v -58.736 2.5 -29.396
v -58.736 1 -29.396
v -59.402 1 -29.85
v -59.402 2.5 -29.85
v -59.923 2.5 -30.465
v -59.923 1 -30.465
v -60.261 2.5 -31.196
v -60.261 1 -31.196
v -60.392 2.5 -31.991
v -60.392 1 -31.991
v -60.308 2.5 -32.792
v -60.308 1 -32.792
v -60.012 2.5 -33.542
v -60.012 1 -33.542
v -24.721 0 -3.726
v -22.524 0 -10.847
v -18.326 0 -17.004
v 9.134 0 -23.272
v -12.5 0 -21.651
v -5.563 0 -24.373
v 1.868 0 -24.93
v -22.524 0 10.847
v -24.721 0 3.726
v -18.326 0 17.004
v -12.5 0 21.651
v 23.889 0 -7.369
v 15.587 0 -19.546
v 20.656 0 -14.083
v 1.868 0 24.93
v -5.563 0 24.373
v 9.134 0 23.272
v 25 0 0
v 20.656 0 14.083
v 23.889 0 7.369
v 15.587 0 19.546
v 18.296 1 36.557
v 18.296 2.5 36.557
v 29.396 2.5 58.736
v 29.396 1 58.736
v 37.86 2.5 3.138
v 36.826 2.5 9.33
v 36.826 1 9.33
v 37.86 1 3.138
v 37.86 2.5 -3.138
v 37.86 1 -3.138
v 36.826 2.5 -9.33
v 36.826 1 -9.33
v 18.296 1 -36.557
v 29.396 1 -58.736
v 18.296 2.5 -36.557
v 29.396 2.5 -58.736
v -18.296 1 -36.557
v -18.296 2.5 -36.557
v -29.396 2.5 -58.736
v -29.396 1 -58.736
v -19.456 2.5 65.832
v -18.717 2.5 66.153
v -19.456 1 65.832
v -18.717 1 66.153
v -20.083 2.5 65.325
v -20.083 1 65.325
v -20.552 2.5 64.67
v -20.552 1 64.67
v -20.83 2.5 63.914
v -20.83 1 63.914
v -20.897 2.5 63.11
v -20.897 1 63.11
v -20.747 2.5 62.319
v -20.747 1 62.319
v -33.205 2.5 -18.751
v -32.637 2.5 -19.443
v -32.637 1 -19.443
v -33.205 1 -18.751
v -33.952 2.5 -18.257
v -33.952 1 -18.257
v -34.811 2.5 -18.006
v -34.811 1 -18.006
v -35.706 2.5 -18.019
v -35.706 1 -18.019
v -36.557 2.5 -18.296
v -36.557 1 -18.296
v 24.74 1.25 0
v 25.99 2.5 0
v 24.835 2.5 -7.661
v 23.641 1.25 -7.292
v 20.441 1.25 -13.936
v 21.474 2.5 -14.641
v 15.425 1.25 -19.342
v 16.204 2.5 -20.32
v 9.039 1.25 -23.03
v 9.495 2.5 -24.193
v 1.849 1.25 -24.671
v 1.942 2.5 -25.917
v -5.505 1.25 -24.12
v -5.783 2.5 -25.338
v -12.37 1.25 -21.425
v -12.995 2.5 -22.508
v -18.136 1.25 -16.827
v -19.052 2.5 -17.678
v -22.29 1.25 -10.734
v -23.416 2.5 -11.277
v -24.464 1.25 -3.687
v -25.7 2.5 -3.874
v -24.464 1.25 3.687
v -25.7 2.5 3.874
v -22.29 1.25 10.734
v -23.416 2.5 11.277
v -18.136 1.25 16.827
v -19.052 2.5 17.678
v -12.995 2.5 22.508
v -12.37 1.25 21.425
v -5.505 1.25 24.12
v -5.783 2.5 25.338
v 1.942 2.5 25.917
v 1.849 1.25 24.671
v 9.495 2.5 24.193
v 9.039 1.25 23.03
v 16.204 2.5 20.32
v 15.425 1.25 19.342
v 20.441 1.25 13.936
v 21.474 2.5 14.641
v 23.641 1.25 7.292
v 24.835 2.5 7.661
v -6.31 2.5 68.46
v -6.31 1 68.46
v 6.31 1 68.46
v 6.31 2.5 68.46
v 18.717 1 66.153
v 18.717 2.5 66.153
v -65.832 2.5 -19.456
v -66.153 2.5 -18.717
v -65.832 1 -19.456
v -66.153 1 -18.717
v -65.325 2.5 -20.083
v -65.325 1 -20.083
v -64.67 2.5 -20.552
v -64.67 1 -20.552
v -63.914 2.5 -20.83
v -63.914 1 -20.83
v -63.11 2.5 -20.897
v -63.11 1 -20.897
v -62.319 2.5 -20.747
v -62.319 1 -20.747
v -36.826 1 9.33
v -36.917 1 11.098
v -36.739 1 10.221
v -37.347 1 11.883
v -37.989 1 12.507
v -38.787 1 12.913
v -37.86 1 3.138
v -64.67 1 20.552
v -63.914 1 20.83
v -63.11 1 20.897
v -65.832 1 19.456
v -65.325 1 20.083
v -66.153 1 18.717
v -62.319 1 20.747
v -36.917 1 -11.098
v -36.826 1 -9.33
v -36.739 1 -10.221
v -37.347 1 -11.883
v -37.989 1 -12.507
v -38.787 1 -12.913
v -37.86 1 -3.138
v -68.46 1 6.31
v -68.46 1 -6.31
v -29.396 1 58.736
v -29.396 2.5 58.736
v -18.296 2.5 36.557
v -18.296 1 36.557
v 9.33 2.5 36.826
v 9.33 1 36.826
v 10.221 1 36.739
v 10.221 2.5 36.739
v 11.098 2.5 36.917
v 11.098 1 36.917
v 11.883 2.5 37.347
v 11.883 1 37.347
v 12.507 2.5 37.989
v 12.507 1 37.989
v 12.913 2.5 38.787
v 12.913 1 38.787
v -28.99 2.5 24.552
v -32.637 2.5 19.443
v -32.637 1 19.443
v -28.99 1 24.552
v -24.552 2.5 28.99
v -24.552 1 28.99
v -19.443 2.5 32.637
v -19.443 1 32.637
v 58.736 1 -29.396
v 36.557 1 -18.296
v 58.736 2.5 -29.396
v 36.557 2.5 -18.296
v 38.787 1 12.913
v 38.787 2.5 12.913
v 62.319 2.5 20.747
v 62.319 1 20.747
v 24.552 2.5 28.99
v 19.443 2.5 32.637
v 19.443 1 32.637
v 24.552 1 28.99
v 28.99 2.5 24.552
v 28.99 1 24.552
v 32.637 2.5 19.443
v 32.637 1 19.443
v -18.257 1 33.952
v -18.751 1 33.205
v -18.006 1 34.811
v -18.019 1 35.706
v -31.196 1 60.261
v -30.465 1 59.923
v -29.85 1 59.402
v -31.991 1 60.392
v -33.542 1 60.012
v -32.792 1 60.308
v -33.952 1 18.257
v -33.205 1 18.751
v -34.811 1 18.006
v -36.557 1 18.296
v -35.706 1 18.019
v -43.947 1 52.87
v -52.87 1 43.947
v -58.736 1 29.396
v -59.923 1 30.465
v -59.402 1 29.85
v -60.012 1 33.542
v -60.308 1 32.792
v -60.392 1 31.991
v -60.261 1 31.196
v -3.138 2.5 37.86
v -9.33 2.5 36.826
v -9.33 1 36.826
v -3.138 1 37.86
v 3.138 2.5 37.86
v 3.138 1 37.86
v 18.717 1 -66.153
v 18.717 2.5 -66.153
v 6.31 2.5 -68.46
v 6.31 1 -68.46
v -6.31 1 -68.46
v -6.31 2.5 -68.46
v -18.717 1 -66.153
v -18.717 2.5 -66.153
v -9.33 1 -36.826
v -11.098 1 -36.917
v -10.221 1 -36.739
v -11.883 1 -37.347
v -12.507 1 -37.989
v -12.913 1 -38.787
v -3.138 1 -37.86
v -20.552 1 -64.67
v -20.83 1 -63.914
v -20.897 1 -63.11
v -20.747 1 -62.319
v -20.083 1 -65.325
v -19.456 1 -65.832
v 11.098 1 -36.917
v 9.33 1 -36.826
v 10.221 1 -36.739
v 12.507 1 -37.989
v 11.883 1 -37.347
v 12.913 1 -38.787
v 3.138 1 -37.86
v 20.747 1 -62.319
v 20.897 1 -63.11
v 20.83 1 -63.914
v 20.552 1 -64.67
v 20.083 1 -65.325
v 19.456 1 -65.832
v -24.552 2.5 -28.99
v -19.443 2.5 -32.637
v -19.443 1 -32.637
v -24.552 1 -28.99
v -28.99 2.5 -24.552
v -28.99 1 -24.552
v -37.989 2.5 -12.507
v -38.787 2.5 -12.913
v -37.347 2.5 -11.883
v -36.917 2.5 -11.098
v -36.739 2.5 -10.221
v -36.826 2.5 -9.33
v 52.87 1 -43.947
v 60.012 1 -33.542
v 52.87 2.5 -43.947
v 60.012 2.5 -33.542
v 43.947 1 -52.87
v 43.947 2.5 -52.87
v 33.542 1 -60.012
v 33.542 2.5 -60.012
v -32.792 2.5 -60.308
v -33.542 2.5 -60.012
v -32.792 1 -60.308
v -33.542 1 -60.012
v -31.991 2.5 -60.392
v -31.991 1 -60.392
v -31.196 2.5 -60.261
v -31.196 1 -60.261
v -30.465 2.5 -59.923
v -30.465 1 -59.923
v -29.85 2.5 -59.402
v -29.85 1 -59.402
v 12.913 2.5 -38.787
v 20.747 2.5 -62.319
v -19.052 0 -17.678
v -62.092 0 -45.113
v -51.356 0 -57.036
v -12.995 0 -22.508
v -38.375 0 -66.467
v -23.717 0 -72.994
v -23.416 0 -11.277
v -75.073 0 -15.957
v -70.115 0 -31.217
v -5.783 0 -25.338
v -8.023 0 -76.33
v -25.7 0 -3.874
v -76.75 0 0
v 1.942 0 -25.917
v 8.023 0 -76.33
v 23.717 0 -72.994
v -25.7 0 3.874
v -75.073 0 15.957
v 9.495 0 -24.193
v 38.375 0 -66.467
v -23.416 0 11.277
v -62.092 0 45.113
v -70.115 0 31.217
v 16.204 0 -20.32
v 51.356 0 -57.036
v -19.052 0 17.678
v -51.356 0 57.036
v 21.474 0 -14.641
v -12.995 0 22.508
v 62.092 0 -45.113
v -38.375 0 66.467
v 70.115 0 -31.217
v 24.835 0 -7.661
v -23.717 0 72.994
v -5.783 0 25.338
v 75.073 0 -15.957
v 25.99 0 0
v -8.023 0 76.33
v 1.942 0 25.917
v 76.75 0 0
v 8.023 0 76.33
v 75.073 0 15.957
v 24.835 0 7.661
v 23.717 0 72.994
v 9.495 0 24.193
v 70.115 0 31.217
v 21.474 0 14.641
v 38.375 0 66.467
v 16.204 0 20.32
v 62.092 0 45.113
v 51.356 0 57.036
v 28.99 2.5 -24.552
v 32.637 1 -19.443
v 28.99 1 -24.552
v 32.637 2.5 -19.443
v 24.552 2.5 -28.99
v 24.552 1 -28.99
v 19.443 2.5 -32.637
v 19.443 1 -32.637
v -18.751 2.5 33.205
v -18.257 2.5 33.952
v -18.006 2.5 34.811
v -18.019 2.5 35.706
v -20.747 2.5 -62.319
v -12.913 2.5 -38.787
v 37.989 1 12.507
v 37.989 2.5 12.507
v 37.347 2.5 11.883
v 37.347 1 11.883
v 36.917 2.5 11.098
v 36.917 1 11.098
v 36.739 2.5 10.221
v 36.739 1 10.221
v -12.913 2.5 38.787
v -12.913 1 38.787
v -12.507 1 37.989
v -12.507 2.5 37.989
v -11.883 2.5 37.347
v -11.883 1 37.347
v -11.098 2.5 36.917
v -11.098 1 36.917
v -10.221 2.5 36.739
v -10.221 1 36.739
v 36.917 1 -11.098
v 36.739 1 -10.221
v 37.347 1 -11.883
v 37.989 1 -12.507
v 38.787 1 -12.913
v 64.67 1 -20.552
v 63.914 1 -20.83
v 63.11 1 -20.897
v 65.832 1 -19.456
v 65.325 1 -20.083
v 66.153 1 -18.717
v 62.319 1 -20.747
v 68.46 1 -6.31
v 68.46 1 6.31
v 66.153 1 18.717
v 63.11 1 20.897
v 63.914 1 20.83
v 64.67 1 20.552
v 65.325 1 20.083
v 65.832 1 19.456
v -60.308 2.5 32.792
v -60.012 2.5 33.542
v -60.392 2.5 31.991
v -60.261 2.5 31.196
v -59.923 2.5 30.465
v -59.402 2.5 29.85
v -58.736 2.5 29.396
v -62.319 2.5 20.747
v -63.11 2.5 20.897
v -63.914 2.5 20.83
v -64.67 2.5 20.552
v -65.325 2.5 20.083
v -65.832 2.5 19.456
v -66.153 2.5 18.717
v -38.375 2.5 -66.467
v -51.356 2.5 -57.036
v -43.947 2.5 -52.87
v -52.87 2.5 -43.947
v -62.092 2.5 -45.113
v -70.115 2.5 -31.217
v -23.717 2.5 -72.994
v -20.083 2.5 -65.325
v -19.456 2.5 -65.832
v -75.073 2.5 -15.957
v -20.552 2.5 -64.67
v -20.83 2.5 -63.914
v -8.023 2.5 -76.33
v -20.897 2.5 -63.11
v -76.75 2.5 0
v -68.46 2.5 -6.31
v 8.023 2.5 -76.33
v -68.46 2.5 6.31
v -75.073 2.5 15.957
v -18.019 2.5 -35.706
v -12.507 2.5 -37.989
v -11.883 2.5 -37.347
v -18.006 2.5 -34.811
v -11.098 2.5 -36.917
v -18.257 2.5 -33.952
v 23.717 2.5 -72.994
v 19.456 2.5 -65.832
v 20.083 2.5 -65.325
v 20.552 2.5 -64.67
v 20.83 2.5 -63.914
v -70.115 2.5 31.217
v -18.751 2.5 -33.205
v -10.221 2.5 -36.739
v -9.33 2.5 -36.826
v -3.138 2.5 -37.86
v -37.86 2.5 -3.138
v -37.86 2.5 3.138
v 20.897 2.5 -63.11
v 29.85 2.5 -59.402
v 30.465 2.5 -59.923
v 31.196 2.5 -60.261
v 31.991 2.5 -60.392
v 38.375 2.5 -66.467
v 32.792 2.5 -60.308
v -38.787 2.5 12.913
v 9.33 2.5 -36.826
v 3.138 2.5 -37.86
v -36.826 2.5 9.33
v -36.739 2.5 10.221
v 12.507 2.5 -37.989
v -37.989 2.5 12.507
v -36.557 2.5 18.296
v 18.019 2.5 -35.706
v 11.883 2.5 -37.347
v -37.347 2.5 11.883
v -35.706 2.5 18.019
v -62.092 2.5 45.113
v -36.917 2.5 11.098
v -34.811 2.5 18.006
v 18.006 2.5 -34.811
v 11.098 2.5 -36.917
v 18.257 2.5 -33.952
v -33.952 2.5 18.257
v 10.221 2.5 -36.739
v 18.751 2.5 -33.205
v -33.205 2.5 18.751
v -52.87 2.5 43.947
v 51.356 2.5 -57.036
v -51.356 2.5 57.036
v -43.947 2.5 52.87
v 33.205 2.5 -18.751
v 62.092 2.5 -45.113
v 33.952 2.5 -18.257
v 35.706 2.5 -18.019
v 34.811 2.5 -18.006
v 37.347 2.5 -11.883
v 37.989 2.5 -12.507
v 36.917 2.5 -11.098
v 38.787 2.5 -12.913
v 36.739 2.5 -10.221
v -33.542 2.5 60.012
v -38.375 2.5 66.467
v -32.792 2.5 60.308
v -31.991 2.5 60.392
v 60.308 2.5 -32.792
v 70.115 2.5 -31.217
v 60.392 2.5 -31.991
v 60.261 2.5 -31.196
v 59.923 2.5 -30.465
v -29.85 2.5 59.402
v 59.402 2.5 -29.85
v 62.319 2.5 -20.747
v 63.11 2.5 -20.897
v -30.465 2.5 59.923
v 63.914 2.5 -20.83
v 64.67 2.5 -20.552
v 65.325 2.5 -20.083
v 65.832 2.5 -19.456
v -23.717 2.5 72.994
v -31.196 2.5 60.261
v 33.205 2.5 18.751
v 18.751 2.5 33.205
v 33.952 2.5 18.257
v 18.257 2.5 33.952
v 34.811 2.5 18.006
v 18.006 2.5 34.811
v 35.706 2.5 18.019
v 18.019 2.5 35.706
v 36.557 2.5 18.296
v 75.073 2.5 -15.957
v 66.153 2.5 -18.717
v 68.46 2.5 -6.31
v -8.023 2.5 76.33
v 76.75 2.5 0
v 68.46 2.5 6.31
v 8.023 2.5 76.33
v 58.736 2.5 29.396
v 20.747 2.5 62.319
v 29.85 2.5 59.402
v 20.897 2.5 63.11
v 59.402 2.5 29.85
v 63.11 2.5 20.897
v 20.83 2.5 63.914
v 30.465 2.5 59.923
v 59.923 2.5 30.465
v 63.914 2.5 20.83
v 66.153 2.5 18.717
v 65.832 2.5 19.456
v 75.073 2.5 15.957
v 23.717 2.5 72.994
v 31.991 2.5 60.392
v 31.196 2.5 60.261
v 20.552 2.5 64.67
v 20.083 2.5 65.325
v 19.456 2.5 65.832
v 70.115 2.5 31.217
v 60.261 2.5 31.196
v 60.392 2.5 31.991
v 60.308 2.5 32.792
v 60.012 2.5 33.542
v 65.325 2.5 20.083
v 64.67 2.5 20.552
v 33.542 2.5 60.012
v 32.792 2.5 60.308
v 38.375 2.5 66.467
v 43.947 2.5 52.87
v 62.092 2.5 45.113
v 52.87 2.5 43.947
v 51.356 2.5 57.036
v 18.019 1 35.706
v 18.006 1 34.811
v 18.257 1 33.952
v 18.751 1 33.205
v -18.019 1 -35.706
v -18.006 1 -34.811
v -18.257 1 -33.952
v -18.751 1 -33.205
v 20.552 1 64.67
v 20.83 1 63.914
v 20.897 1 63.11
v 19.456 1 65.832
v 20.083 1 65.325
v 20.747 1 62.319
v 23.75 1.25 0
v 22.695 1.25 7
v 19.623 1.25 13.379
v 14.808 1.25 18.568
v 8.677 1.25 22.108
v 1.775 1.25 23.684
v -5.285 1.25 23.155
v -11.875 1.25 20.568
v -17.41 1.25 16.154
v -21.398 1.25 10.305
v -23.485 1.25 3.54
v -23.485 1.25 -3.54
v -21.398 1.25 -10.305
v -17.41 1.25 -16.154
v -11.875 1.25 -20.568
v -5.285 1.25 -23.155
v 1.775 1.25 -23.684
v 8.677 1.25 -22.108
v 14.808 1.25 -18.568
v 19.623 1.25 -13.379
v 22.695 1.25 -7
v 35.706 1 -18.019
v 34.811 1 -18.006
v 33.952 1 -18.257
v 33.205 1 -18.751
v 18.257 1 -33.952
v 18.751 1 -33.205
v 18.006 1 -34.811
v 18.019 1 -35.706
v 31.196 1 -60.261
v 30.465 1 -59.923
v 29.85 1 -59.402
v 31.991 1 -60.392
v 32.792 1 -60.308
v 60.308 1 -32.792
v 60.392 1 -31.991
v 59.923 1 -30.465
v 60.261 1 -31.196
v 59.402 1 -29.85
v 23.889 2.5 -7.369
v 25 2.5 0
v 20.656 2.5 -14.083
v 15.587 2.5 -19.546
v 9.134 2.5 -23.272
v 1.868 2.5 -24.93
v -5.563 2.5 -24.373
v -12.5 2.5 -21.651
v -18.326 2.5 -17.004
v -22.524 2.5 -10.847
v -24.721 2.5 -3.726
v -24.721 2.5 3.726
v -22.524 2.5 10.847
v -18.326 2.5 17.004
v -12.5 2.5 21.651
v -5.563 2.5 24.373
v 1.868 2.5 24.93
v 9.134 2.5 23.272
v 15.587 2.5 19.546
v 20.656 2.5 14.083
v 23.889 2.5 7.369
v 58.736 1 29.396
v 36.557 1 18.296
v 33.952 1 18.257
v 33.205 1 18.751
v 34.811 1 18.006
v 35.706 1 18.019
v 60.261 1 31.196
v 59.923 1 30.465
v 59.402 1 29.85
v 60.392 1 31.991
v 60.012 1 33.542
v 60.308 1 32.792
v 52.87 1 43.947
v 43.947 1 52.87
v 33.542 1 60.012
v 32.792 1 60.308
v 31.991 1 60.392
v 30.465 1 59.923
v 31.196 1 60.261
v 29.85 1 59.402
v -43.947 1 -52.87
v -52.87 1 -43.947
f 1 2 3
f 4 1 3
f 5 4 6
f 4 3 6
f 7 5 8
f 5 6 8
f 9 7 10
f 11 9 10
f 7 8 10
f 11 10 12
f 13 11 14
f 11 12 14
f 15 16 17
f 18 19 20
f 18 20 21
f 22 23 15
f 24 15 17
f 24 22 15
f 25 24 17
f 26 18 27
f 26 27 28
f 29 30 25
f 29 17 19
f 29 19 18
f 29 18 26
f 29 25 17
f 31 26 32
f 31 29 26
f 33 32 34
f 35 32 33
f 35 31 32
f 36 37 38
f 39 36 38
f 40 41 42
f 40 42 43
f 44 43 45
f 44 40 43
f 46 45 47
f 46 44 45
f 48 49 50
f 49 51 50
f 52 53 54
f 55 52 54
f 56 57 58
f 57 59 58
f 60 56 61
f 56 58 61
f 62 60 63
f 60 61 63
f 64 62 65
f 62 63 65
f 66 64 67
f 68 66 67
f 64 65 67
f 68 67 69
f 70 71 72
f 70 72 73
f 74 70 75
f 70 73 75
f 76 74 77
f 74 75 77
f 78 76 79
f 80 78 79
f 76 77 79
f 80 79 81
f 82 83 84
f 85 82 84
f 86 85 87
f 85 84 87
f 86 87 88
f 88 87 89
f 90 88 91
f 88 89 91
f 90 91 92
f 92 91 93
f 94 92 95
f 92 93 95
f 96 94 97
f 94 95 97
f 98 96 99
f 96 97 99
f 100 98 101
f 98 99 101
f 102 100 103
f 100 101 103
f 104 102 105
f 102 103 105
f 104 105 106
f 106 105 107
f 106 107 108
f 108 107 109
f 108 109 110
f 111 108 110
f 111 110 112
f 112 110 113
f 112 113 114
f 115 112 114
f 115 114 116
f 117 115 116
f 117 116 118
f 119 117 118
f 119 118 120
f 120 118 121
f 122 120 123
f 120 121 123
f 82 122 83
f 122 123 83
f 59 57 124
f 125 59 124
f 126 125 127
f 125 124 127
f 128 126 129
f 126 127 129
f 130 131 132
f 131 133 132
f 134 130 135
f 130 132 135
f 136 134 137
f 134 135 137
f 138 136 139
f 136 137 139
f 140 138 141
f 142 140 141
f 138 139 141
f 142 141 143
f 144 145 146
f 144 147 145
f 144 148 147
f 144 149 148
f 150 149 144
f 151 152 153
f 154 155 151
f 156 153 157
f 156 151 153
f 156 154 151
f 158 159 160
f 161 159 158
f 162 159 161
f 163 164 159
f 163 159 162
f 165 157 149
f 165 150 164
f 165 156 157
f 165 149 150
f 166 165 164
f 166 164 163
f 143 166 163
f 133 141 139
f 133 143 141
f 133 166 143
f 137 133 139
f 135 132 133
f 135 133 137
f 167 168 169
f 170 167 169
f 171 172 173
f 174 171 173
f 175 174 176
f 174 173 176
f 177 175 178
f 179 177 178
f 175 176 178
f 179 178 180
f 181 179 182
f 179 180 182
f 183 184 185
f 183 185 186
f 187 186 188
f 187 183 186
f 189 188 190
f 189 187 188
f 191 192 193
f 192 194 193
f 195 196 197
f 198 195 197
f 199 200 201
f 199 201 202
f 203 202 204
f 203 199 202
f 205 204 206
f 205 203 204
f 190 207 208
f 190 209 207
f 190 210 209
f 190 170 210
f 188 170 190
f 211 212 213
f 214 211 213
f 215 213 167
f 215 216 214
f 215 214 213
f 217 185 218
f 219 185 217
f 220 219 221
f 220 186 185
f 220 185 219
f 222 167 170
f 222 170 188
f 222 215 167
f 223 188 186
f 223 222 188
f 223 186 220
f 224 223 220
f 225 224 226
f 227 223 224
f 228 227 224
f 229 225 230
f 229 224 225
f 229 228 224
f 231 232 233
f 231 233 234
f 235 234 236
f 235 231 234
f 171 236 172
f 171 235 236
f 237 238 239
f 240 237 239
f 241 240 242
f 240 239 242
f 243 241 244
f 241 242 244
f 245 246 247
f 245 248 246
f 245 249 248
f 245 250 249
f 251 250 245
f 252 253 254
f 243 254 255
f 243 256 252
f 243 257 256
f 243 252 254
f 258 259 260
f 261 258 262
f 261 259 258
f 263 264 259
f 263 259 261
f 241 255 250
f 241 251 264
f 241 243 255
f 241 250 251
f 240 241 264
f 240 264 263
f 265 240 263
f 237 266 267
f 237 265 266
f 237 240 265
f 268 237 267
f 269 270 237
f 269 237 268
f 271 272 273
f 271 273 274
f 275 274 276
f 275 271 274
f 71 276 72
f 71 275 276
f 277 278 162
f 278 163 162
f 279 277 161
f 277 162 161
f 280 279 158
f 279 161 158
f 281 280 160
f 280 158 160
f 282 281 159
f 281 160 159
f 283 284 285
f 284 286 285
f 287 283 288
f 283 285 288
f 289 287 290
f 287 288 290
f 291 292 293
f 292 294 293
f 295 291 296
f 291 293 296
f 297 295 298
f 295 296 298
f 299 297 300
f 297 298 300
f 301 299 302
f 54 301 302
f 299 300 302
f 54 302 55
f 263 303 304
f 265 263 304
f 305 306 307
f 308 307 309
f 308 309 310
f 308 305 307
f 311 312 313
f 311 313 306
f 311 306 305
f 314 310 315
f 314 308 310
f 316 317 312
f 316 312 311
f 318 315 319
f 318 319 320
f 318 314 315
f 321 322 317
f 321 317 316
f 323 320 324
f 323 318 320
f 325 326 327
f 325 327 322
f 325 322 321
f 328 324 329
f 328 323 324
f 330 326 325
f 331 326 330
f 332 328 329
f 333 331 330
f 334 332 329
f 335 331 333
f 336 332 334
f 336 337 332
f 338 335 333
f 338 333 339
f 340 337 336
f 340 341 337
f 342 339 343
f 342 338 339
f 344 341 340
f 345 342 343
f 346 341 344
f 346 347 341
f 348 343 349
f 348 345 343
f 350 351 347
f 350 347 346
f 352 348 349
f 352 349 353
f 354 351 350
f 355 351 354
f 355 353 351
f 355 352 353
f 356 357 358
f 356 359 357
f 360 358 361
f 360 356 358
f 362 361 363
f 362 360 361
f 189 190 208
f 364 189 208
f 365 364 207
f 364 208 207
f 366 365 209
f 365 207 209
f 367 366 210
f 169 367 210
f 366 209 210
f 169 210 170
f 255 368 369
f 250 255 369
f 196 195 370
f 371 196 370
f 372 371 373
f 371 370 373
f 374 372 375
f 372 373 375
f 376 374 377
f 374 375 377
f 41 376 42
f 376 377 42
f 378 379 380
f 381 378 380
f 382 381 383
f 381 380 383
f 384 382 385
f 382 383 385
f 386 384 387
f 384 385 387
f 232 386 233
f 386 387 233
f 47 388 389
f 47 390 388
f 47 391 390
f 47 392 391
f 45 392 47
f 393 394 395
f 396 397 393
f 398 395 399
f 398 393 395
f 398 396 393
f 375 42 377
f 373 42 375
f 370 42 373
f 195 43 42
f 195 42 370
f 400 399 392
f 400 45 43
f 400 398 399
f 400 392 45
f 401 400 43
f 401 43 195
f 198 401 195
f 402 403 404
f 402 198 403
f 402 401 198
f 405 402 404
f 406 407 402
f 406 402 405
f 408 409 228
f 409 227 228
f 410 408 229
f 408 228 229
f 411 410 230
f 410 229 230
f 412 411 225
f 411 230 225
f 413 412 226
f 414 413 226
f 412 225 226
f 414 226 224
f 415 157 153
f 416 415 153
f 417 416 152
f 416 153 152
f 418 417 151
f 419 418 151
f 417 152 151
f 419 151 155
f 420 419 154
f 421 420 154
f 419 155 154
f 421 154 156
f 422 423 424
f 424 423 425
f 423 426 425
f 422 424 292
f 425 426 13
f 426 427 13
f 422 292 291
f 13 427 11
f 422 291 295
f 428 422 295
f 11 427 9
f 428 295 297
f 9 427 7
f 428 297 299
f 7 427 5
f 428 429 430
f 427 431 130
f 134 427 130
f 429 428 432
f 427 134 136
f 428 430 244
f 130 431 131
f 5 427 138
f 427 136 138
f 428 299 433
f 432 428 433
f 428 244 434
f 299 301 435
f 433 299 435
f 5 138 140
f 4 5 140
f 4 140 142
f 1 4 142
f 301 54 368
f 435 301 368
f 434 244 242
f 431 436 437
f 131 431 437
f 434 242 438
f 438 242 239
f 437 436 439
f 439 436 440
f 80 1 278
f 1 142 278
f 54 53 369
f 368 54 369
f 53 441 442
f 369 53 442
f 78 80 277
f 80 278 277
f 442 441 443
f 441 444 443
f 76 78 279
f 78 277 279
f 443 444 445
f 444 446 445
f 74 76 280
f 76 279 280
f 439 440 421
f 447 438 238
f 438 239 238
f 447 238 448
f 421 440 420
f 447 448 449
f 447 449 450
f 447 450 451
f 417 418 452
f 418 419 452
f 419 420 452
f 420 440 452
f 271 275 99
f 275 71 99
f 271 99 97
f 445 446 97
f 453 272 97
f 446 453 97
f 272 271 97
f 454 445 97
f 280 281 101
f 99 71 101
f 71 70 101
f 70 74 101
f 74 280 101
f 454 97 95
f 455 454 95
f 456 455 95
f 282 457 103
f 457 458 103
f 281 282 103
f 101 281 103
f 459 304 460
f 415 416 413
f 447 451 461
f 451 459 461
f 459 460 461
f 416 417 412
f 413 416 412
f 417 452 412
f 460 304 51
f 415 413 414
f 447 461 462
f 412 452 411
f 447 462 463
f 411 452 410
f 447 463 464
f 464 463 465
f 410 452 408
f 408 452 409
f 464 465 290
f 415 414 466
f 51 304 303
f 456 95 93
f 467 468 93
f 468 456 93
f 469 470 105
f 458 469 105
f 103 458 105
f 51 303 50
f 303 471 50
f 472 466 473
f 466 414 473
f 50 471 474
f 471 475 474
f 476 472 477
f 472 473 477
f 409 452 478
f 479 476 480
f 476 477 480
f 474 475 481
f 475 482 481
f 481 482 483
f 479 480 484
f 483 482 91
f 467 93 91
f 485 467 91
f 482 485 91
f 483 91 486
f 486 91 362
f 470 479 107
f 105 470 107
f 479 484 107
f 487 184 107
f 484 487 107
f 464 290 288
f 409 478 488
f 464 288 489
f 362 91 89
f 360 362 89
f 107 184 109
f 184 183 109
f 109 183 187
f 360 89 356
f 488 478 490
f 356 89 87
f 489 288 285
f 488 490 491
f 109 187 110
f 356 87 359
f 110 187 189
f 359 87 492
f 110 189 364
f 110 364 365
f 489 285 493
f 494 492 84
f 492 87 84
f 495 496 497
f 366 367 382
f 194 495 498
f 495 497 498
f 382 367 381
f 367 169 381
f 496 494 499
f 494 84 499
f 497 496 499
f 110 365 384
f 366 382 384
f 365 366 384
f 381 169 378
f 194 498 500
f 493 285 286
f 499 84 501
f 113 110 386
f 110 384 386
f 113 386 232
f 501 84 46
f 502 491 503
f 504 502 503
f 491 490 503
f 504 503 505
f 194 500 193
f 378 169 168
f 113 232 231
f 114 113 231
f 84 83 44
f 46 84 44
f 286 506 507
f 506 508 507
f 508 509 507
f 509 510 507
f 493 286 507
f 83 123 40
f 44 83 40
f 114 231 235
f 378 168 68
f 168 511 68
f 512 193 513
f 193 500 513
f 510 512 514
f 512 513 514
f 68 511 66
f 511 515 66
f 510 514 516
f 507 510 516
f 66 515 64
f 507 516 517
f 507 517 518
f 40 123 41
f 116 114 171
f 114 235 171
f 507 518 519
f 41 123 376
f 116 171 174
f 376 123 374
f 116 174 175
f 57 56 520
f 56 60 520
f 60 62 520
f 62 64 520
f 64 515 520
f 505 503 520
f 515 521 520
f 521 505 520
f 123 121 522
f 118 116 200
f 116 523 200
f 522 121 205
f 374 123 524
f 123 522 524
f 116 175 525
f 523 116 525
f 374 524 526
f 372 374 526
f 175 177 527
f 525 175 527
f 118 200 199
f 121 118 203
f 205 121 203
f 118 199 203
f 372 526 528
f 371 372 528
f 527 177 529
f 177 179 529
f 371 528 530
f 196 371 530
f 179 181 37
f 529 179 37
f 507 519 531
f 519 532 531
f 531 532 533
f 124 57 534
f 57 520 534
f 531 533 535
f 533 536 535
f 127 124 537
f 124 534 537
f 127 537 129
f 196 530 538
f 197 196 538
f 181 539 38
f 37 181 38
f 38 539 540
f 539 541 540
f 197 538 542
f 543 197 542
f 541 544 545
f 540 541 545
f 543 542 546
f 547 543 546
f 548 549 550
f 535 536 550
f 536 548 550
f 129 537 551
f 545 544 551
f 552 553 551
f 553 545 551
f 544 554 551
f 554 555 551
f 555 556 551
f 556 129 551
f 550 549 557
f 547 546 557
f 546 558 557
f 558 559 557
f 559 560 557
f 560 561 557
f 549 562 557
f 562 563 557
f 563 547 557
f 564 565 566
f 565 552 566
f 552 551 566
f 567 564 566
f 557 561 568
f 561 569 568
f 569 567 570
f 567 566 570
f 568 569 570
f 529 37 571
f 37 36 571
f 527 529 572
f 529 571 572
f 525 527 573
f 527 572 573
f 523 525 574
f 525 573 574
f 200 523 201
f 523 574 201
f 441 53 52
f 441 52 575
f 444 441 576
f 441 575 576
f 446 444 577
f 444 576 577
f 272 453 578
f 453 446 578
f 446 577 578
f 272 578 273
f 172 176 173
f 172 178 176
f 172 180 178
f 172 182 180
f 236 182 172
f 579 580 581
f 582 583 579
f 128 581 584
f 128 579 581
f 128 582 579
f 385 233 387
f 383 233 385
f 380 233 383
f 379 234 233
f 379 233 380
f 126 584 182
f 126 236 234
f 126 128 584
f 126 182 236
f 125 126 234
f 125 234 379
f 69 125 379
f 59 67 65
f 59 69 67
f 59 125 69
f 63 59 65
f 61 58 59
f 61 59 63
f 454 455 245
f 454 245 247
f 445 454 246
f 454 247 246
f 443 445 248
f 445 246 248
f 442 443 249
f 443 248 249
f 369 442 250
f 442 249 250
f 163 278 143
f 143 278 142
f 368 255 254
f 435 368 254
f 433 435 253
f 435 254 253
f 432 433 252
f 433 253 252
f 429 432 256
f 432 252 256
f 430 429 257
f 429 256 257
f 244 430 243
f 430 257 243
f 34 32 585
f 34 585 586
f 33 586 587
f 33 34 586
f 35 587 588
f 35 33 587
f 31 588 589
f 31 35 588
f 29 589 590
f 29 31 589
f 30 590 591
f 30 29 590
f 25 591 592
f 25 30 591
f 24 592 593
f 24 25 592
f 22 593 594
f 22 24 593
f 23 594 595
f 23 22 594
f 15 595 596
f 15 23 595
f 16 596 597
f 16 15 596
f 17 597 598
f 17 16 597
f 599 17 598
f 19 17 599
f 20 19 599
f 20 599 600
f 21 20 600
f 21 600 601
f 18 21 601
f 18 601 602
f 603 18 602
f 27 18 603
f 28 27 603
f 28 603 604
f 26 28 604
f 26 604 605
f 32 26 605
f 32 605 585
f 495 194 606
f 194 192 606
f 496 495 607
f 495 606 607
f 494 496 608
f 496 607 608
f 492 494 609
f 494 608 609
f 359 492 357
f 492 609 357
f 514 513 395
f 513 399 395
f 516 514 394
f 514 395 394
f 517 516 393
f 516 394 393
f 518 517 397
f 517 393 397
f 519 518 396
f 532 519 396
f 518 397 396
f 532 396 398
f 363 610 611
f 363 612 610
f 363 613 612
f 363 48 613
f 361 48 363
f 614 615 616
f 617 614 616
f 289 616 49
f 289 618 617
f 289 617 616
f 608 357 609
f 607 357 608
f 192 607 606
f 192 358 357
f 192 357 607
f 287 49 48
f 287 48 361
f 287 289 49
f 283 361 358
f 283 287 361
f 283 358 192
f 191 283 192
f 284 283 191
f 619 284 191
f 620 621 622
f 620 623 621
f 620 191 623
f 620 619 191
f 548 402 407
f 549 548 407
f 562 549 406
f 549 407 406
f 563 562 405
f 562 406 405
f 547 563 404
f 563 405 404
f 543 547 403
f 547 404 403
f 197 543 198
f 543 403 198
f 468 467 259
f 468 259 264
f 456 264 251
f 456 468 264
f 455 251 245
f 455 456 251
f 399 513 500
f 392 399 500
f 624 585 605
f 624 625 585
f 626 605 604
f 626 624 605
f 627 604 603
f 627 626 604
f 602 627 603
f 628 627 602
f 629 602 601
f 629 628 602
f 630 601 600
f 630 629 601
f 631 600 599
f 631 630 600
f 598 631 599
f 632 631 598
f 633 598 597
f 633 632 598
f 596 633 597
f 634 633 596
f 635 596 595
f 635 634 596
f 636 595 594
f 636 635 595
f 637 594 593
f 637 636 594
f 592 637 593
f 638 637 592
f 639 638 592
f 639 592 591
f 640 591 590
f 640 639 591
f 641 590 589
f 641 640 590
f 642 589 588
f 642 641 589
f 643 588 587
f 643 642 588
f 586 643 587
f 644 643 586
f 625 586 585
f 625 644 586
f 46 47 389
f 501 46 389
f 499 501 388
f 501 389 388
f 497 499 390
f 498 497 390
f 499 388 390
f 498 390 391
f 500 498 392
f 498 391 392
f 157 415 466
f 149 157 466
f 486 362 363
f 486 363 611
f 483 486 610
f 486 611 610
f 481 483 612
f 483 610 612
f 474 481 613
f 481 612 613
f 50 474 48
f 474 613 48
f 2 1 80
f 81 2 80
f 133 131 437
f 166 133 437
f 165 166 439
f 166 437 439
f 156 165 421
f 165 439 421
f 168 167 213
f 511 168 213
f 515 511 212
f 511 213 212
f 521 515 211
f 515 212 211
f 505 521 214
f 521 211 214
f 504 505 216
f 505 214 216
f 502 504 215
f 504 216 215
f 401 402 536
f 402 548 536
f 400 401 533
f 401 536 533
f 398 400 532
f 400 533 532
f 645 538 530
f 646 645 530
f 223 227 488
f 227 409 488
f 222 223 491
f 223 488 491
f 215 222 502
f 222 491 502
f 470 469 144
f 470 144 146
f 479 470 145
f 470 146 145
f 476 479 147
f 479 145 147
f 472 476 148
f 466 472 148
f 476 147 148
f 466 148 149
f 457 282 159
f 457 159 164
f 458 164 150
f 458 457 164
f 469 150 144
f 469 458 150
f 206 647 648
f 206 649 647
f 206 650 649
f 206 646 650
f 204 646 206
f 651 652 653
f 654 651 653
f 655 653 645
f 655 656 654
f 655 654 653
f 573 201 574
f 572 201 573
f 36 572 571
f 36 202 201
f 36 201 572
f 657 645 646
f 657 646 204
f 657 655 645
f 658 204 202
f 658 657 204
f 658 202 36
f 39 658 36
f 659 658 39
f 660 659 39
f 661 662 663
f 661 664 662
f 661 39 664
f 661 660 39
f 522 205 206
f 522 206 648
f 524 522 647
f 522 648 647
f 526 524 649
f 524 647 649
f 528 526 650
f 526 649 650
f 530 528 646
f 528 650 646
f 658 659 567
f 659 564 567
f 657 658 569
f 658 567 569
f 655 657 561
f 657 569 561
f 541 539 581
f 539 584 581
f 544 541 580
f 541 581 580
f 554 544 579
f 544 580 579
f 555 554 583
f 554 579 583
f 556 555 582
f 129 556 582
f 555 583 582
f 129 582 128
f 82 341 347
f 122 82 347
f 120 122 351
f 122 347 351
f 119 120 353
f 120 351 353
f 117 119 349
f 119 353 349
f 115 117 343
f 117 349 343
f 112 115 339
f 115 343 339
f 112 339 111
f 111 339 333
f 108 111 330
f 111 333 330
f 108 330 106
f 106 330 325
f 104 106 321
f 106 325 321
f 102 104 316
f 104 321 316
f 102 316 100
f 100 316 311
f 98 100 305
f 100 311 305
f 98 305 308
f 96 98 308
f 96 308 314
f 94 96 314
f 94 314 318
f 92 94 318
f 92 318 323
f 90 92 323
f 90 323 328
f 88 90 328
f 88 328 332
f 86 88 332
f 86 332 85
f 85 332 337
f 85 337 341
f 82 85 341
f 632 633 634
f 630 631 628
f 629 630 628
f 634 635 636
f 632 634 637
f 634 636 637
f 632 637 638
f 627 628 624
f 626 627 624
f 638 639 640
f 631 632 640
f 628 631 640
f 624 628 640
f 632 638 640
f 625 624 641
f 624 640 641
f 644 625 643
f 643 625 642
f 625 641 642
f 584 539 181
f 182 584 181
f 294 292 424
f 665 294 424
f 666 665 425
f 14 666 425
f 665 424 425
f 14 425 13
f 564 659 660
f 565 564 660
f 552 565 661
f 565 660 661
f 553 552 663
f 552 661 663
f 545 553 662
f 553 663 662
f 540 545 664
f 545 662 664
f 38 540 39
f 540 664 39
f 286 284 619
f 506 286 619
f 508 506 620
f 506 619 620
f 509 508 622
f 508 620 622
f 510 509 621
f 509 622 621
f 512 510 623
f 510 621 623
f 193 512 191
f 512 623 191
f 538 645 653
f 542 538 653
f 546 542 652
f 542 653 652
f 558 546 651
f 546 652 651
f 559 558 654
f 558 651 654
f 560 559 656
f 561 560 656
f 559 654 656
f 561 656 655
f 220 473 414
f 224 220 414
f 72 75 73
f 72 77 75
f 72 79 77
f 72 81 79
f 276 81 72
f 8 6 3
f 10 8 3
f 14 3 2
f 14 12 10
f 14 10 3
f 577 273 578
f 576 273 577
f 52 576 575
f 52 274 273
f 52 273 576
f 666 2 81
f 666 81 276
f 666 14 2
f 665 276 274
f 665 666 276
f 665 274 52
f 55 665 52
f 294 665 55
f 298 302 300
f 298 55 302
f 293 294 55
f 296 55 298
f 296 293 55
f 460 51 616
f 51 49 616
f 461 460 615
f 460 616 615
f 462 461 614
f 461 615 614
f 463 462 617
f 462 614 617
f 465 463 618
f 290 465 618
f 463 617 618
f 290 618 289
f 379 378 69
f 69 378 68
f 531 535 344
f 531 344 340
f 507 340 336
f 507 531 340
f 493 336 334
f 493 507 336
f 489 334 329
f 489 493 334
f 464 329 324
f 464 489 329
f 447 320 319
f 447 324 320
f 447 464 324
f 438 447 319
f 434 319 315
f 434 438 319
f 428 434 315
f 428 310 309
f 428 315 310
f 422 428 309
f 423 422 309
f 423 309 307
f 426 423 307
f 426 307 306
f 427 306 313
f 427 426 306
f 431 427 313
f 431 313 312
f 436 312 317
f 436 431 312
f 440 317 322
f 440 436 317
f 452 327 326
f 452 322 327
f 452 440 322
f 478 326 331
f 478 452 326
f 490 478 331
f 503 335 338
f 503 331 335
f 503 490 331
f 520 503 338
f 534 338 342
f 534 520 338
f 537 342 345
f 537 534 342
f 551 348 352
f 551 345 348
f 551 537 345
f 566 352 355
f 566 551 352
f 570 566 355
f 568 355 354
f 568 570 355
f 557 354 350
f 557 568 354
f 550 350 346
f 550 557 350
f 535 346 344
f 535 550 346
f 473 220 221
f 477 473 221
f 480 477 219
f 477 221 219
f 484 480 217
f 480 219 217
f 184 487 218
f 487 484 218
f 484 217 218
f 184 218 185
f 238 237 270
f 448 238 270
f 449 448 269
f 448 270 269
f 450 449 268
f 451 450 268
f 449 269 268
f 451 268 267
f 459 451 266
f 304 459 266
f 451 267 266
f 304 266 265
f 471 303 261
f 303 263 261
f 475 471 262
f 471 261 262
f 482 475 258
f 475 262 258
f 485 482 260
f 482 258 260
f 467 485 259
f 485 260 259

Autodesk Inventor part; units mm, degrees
ref_plane "YZ Plane" through (0, 0, 0) normal (1, 0, 0) x (0, 1, 0)
ref_plane "XZ Plane" through (0, 0, 0) normal (0, 1, 0) x (-1, 0, 0)
ref_plane "XY Plane" through (0, 0, 0) normal (0, 0, 1) x (1, 0, 0)
sketch "Sketch1" plane through (0, 0, 0) normal (0, 0, 1) x (1, 0, 0)
  line L0 (0, 0) -> (0, -126.8557)
  line L1 (0, 0) -> (25, 0)
  line L2 (25, 0) -> (23.75, 1.25)
  line L3 (23.75, 1.25) -> (25, 2.5)
  line L4 (25, 2.5) -> (0, 2.5)
  line L5 (0, 2.5) -> (0, 0)
  line L6 (25.9899, 2.5) -> (24.7399, 1.25)
  line L7 (24.7399, 1.25) -> (25.9899, 0)
  line L8 (25.9899, 0) -> (76.75, 0)
  line L9 (76.75, 0) -> (76.75, 2.5)
  line L10 (76.75, 2.5) -> (25.9899, 2.5)
  point P0 (0, 1.25)
  dimension "d0" = 45
  dimension "d1" = 153.5
  dimension "d2" = 2.5
  dimension "d3" = 0.7
  dimension "d4" = 50
revolve "Revolution1" add sketch "Sketch1" angle 360 about axis through (0, 0, 0) along (0, -1, 0)
sketch "Sketch2" plane through (0, 2.5, 0) normal (0, 1, 0) x (1, 0, 0)
  circle A0 centre (0, 0) radius 25.9899 projected
  circle A1 centre (0, 0) radius 76.75 projected
  circle A2 centre (0, 0) radius 68.75
  circle A3 centre (0, 0) radius 37.9899
  line L0 (-21.7163, 65.2301) -> (-12, 36.0449)
  line L1 (12, 36.0449) -> (21.7163, 65.2301)
  line L2 (-12, 36.0449) -> (12, 36.0449) construction
  line L3 (-61.4804, 30.7689) -> (-33.9729, 17.0023)
  line L4 (-17.0023, 33.9729) -> (-30.7689, 61.4804)
  line L5 (-65.2301, -21.7163) -> (-36.0449, -12)
  line L6 (-36.0449, 12) -> (-65.2301, 21.7163)
  line L7 (-30.7689, -61.4804) -> (-17.0023, -33.9729)
  line L8 (-33.9729, -17.0023) -> (-61.4804, -30.7689)
  line L9 (21.7163, -65.2301) -> (12, -36.0449)
  line L10 (-12, -36.0449) -> (-21.7163, -65.2301)
  line L11 (61.4804, -30.7689) -> (33.9729, -17.0023)
  line L12 (17.0023, -33.9729) -> (30.7689, -61.4804)
  line L13 (65.2301, 21.7163) -> (36.0449, 12)
  line L14 (36.0449, -12) -> (65.2301, -21.7163)
  line L15 (30.7689, 61.4804) -> (17.0023, 33.9729)
  line L16 (33.9729, 17.0023) -> (61.4804, 30.7689)
  dimension "d6" = 8
  dimension "d7" = 12
  dimension "d10" = 360
  dimension "d12" = 24
extrude "Extrusion1" cut sketch "Sketch2" against normal blind 1.5 contours L1 A3 L0 A2
fillet "Fillet1" radius 3 4 edges at (12, 1.75, -36.0449) (21.7163, 1.75, -65.2301) (-12, 1.75, -36.0449) (-21.7163, 1.75, -65.2301)
pattern_circular "Circular Pattern1" count 8 over 360 about axis through (0, 1.25, 0) along (0, -1, 0) of "Extrusion1", "Fillet1"
properties part number "centre" material "ABS Plastic"
